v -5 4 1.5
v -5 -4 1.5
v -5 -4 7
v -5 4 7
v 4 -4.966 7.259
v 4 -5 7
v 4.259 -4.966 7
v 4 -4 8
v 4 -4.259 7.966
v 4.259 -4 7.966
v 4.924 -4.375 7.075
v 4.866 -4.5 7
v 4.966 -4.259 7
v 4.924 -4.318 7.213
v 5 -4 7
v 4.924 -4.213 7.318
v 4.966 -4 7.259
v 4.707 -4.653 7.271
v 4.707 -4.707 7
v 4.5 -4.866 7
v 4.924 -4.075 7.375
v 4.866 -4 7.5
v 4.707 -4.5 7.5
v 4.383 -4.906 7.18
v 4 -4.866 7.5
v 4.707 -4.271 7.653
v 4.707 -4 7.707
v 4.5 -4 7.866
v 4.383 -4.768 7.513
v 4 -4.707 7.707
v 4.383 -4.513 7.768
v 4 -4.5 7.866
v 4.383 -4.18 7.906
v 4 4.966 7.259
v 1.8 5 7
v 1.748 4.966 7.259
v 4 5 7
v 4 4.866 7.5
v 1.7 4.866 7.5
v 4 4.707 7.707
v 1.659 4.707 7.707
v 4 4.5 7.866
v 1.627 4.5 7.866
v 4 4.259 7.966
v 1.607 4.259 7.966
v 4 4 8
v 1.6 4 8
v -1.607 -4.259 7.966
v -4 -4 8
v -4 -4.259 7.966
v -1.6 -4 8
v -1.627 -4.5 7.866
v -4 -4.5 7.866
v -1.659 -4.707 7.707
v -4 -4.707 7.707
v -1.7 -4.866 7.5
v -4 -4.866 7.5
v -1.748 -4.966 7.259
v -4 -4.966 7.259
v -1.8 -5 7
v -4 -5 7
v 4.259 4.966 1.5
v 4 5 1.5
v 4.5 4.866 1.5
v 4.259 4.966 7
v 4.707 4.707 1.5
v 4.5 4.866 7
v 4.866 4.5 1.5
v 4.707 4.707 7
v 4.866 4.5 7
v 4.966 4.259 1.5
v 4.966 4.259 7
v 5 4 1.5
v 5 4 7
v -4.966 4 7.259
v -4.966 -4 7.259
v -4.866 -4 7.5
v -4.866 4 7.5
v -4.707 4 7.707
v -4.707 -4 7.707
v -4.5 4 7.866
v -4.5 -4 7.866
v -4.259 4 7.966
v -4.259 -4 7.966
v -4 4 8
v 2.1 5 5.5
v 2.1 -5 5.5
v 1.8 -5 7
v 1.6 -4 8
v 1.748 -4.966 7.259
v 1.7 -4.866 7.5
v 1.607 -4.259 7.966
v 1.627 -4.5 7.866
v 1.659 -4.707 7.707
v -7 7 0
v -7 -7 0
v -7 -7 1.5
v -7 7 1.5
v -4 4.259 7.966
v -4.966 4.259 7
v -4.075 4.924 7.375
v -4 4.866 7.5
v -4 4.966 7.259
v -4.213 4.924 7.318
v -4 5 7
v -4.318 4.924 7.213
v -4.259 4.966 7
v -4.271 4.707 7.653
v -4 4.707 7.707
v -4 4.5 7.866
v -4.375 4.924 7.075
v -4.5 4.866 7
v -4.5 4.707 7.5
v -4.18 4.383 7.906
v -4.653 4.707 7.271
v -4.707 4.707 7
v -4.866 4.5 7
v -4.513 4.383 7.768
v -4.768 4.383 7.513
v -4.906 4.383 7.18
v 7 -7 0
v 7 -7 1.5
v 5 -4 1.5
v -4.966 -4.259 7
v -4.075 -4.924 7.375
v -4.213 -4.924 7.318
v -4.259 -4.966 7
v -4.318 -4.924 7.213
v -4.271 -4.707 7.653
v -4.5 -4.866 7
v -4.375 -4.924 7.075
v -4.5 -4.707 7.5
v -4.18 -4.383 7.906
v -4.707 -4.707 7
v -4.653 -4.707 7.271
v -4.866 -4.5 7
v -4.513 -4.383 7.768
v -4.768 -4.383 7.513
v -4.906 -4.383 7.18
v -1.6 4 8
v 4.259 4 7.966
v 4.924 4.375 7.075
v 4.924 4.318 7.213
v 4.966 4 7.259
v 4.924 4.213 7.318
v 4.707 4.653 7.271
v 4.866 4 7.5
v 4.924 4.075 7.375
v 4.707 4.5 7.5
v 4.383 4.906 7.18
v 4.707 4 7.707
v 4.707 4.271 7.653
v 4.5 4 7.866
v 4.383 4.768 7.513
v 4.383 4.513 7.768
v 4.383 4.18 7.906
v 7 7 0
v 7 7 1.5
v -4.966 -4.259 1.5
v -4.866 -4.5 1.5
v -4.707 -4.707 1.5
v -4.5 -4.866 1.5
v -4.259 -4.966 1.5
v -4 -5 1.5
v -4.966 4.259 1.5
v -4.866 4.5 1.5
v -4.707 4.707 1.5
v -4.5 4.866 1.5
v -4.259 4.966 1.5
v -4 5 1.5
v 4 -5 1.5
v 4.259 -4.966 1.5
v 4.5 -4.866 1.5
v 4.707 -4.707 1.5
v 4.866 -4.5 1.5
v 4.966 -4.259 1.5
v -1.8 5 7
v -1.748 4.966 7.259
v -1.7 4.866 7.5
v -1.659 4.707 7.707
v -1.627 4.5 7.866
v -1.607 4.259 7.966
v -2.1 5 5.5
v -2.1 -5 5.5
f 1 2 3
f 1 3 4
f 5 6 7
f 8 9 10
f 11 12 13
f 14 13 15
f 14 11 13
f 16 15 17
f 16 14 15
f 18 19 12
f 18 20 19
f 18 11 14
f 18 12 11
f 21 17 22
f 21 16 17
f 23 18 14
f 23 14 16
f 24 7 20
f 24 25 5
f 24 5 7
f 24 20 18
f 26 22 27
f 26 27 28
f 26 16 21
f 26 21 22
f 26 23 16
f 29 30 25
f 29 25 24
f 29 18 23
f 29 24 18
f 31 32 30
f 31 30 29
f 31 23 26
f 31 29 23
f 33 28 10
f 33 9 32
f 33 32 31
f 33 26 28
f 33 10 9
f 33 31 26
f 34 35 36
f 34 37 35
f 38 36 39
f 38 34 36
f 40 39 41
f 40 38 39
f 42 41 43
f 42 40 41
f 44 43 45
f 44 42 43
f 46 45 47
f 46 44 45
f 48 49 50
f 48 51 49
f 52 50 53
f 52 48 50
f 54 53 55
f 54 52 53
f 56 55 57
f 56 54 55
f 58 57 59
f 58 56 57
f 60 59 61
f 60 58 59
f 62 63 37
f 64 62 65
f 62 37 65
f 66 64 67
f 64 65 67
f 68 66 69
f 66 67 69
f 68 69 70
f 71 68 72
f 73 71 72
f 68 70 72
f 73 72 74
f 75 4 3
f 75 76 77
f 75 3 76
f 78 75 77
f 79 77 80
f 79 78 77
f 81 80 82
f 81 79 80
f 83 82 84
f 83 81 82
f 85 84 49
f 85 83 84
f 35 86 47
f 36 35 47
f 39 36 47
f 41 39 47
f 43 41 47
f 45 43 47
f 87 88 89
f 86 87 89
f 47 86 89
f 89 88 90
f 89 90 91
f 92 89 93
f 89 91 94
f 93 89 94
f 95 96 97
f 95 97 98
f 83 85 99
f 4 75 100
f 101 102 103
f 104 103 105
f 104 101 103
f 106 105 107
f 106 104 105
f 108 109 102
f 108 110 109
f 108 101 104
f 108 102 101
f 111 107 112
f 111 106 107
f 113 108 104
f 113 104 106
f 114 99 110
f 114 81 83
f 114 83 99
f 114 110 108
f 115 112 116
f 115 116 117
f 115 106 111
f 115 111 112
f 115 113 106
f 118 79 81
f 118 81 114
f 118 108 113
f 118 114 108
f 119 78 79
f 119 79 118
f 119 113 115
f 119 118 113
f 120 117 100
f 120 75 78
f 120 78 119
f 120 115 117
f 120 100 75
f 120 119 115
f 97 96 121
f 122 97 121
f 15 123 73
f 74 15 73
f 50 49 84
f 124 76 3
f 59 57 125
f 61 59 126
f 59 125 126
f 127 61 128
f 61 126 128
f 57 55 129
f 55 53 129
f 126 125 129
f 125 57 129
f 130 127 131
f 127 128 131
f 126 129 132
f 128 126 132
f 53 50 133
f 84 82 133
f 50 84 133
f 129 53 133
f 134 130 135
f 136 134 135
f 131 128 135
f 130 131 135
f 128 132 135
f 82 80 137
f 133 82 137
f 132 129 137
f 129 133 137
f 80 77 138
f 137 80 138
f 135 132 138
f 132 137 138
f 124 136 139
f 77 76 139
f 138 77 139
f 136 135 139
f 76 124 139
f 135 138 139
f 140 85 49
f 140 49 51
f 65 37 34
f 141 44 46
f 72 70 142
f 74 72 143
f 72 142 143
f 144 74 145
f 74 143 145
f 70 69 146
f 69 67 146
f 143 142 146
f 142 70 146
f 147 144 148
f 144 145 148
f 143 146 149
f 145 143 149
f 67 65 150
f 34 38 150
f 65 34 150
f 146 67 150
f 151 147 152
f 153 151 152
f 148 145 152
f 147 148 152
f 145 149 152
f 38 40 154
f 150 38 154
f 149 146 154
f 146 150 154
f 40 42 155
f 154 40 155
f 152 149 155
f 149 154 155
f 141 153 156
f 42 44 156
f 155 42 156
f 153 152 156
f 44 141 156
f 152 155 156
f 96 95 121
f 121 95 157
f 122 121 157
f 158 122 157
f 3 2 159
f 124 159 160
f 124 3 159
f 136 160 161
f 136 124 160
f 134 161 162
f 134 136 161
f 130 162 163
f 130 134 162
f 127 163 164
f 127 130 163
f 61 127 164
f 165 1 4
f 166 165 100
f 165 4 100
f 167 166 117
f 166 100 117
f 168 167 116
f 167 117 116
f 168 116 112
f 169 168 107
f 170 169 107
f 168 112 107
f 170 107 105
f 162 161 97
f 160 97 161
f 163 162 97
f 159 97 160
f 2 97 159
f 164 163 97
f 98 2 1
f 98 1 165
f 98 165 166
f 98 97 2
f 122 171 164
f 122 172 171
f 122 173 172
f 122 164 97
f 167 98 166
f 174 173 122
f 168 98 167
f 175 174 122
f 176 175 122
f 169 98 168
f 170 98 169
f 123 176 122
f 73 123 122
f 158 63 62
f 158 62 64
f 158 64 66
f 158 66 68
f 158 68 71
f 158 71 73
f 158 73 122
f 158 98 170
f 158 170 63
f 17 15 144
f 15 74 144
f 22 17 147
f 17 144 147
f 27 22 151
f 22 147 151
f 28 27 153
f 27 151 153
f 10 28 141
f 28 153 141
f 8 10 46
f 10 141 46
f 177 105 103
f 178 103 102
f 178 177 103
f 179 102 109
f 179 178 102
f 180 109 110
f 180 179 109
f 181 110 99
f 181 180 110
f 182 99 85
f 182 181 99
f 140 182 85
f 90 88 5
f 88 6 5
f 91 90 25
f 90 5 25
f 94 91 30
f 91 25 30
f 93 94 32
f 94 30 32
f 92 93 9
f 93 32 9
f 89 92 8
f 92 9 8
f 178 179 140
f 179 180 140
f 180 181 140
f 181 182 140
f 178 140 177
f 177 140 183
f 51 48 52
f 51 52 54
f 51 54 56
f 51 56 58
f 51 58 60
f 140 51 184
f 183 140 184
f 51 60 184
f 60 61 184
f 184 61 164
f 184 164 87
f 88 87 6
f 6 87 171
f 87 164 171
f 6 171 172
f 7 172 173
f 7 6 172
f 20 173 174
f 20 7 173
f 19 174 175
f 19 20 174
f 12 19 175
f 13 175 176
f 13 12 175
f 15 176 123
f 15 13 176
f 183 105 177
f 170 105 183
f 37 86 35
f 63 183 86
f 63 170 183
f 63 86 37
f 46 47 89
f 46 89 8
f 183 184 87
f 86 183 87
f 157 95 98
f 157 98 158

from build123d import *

# Parameters (mm, degrees)
F0_W     = 14
F0_H     = 14
F0_W_2   = 10
F0_H_2   = 10
F1_DEPTH = 1.5
F2_DEPTH = 8
F4_DEPTH = 25
F5_R     = 1


with BuildPart() as f1:
    # F0 (on Top) → F1 (new body)
    with BuildSketch(Plane.XY):
        Rectangle(F0_W, F0_H)
        Rectangle(F0_W_2, F0_H_2, mode=Mode.SUBTRACT)
    extrude(amount=F1_DEPTH)

    # F0 (on Top) → F2 (join)
    with BuildSketch(Plane.XY):
        Rectangle(F0_W_2, F0_H_2)
    extrude(amount=F2_DEPTH)

    # F3 (on face) → F4 (cut)
    with BuildSketch(Plane.XZ.offset(5)):
        Polygon((1.6, 8), (-1.6, 8), (-2.1, 5.5), (2.1, 5.5), align=None)
    extrude(amount=-F4_DEPTH, mode=Mode.SUBTRACT)

    # F5
    f5_edges = [f1.edges().sort_by_distance(p)[0] for p in [
        (-5, 0, 8),
        (3.3, -5, 8),
        (-3.3, -5, 8),
        (-3.3, 5, 8),
        (3.3, 5, 8),
        (-5, 5, 4.75),
        (-5, -5, 4.75),
        (5, -5, 4.75),
        (5, 5, 4.75),
        (5, 0, 8),
    ]]
    fillet(f5_edges, radius=F5_R)


solid = f1.part
